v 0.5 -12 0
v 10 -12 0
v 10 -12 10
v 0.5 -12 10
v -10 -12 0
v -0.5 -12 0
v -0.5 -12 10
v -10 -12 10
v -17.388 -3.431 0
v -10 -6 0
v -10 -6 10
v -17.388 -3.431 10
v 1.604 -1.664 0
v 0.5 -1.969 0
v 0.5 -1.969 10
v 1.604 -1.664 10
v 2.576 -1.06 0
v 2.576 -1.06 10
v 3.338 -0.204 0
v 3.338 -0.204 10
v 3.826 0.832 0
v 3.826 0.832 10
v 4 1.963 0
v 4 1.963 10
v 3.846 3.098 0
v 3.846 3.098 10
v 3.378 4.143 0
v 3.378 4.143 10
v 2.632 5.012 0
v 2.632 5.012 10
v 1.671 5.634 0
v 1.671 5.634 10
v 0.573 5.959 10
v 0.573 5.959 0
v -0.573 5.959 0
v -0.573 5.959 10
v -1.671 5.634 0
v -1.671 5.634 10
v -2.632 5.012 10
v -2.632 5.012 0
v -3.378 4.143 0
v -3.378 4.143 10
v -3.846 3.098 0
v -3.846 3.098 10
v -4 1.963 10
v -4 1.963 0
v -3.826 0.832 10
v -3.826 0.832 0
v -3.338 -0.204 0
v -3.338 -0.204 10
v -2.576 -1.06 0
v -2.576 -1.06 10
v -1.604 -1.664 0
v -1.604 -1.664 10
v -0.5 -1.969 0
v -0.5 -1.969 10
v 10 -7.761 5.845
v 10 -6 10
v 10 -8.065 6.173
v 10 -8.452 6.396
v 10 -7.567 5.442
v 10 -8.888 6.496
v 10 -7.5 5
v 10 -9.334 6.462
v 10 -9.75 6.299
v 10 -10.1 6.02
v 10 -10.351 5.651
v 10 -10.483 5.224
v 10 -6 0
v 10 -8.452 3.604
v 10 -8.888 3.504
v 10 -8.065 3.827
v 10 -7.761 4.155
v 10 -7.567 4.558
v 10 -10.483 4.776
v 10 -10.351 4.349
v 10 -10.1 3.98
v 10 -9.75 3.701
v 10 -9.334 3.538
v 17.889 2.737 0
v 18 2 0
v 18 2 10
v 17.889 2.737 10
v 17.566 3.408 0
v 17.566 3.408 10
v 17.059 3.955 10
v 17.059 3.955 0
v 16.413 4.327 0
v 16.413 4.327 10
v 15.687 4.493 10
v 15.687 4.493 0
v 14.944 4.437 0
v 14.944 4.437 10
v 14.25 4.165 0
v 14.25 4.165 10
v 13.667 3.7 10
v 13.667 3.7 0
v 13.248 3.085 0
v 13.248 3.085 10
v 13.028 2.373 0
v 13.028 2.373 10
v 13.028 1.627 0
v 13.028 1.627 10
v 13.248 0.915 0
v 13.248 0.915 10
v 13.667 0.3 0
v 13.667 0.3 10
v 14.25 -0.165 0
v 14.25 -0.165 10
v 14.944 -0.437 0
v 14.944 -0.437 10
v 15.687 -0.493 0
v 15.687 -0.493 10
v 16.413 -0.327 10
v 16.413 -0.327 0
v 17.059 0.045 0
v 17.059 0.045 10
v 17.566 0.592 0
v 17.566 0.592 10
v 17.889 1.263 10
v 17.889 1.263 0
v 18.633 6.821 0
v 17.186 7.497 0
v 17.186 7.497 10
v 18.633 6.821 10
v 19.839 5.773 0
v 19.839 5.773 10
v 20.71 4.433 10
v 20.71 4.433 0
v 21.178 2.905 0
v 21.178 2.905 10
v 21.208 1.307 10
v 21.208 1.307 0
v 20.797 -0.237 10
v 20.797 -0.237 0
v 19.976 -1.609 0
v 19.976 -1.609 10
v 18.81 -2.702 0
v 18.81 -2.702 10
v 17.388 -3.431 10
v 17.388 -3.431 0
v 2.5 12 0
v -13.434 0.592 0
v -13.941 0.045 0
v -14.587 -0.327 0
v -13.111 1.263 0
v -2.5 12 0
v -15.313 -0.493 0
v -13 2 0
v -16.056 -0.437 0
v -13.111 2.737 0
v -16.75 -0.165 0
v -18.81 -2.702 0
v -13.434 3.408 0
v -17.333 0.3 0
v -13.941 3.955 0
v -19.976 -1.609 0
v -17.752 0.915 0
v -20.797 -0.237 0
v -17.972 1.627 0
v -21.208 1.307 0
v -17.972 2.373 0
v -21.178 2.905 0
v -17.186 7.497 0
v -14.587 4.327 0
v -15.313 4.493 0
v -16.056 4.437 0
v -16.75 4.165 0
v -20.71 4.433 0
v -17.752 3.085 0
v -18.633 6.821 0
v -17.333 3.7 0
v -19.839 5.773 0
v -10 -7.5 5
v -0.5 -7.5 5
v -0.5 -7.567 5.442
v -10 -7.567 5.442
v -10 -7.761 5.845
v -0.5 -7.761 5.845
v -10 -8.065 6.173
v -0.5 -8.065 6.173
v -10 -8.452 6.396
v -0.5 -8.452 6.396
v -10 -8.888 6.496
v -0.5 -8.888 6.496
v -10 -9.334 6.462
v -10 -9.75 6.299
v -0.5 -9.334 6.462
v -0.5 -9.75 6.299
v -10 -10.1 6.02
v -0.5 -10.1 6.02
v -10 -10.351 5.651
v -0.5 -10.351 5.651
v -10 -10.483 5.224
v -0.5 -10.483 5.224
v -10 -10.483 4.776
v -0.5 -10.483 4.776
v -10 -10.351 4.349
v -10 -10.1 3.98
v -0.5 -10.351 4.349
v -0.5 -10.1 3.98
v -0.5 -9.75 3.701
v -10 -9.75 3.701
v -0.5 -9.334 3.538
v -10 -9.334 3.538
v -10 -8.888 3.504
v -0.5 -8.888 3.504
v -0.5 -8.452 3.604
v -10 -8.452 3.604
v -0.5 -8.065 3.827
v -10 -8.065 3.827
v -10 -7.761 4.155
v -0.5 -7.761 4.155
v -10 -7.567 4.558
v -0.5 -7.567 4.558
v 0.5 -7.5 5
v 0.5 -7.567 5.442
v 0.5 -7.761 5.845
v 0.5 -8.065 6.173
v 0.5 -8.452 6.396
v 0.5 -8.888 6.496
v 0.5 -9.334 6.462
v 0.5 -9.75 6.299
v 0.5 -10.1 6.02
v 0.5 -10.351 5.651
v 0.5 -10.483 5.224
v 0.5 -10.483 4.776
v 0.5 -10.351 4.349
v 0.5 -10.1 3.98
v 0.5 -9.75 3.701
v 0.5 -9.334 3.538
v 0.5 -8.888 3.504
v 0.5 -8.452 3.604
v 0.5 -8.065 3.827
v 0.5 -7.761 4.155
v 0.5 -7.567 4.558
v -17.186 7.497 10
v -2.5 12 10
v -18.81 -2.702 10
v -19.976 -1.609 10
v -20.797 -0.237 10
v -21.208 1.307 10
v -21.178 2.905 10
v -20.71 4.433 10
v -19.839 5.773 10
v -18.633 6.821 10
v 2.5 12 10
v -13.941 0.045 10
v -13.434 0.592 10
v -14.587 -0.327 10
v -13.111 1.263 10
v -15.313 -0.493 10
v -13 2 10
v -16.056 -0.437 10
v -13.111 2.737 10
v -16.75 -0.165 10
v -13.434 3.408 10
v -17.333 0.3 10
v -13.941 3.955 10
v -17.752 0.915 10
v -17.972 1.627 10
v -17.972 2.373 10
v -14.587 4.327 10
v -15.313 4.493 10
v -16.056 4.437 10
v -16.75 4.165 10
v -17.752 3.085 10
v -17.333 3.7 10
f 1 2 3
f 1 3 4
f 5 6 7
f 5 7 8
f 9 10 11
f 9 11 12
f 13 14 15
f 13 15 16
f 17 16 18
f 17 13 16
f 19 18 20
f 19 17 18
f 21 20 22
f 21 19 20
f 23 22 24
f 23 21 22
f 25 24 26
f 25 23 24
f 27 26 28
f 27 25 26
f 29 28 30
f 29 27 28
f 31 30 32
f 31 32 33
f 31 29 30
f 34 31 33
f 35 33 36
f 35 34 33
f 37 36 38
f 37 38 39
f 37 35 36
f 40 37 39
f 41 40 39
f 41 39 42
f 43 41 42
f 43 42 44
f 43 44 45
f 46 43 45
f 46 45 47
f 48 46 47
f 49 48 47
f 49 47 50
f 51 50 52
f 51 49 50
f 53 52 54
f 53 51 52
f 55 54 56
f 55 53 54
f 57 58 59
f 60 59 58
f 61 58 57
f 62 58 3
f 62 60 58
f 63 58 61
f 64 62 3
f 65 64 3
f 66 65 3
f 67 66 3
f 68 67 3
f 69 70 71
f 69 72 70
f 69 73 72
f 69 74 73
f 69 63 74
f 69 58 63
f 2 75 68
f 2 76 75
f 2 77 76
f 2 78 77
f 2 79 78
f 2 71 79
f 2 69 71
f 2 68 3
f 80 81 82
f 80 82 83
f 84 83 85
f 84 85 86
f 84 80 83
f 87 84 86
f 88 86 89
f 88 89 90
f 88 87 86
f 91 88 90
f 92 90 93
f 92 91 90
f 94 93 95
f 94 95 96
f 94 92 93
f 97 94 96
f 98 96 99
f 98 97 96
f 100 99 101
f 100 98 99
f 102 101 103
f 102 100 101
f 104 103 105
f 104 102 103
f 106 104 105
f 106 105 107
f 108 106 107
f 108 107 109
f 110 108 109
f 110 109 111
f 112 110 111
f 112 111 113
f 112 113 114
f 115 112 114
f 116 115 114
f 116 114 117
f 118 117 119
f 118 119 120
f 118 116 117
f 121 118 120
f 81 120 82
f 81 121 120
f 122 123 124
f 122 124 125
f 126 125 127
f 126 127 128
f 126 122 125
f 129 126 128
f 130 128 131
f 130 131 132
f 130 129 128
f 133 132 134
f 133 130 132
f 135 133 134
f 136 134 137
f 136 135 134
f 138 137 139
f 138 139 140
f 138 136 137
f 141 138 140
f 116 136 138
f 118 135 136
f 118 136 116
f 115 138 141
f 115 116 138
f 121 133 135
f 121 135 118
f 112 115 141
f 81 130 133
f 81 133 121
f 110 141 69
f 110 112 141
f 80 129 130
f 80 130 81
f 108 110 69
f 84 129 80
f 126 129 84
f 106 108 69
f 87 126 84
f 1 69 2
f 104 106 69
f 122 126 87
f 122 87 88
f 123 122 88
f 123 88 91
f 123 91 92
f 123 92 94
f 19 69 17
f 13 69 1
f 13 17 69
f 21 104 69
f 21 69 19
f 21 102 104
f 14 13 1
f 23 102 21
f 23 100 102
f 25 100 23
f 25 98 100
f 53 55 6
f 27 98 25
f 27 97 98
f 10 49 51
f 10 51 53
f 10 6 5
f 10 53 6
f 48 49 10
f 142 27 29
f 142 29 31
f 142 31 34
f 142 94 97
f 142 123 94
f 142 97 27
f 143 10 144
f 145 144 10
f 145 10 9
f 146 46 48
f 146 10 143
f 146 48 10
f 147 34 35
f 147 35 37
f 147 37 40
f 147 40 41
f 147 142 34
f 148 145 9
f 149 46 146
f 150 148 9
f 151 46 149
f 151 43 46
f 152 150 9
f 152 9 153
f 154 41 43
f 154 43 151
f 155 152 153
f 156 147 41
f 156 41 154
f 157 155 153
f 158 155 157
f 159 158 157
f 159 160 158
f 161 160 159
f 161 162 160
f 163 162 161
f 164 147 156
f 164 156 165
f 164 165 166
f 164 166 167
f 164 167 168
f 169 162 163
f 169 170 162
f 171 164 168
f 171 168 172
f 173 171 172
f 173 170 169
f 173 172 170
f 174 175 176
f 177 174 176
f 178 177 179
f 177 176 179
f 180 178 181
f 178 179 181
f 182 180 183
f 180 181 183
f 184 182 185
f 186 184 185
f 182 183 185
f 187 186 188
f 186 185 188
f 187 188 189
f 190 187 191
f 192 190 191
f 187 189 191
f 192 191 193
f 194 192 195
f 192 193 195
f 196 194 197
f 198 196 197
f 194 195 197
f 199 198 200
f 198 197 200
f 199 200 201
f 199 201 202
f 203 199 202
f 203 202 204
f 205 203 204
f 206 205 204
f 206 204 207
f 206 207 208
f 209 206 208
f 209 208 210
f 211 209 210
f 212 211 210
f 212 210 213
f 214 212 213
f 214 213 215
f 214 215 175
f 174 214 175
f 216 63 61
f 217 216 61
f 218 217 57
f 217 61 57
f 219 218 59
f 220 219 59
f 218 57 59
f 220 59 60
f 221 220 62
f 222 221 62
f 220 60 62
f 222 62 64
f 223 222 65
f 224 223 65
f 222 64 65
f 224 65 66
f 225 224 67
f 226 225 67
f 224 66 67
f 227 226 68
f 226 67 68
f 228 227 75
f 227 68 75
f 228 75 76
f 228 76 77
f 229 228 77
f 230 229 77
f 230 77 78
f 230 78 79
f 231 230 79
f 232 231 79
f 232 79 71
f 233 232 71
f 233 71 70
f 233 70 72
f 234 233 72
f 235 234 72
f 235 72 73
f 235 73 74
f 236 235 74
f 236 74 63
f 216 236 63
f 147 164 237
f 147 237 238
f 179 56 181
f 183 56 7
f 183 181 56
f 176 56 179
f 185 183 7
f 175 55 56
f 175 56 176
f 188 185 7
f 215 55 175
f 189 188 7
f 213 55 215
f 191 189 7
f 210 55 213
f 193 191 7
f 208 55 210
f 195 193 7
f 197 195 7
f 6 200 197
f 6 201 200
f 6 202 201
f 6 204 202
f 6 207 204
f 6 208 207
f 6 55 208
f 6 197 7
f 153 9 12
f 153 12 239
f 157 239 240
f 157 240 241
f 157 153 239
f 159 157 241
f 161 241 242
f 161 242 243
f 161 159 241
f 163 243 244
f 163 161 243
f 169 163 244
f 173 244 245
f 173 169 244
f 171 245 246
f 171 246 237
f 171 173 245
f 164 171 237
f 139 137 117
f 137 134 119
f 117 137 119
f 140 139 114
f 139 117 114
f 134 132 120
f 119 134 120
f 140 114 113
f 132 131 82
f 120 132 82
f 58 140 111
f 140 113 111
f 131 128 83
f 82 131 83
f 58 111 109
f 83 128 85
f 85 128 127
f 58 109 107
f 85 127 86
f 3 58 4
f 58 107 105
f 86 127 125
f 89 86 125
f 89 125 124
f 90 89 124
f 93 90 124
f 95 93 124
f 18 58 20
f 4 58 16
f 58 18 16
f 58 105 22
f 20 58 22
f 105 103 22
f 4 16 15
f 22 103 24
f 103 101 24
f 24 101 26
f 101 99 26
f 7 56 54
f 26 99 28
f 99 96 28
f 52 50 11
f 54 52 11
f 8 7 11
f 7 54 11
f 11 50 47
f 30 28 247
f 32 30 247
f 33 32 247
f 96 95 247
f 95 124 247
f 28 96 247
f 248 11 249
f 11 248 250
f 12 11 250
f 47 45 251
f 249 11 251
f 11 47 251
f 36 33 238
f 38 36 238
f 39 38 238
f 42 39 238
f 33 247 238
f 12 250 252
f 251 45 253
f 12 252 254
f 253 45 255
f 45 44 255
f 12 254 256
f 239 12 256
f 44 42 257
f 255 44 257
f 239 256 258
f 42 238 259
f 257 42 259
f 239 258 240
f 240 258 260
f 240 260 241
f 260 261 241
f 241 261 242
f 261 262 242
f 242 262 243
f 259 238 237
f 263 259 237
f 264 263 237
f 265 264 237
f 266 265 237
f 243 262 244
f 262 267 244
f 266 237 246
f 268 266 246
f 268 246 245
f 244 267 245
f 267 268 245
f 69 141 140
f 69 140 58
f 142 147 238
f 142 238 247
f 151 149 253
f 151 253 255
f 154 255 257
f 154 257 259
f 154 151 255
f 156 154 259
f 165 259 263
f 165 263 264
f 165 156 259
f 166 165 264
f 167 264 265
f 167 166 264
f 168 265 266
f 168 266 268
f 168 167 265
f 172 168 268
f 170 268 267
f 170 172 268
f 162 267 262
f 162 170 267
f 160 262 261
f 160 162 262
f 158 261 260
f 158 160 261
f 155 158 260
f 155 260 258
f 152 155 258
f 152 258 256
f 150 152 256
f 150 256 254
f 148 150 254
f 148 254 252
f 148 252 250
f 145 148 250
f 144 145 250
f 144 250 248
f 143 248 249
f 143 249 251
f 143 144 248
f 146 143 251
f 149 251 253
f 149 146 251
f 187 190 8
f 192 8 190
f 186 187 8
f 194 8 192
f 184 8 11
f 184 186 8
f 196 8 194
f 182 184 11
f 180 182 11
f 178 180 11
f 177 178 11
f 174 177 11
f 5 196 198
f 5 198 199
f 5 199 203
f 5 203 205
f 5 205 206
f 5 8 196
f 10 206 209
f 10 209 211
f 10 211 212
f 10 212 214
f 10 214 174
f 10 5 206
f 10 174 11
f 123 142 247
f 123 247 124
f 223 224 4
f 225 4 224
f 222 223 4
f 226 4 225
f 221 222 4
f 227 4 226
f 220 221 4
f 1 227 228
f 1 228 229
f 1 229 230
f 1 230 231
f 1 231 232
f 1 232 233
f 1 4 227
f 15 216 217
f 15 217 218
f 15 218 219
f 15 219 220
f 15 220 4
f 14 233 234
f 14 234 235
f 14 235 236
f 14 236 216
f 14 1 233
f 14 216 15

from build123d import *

# Parameters (mm, degrees)
SKETCH_1_R          = 2.5
EXTRUDE_1_DEPTH     = 10
SKETCH_2_R          = 1.5
CUT_EXTRUDE_1_DEPTH = 35.936549629


with BuildPart() as part:
    # 草图1 → 凸台-拉伸1 (new body)
    with BuildSketch(Plane.XY):
        with BuildLine():
            Line((0.5, -12), (10, -12))
            Line((10, -12), (10, -6))
            Line((10, -6), (17.388376345, -3.431071237))
            ThreePointArc((17.388376345, -3.431071237), (21.249009569, 2.10671914), (17.185510359, 7.497413467))
            Line((17.185510359, 7.497413467), (2.5, 12))
            Line((2.5, 12), (-2.5, 12))
            Line((-2.5, 12), (-17.185510359, 7.497413467))
            ThreePointArc((-17.185510359, 7.497413467), (-20.123536772, 5.418392563), (-21.25, 2))
            ThreePointArc((-21.25, 2), (-20.186185228, -1.331991598), (-17.388376345, -3.431071237))
            Line((-17.388376345, -3.431071237), (-10, -6))
            Line((-10, -6), (-10, -12))
            Line((-10, -12), (-0.5, -12))
            Line((-0.5, -12), (-0.5, -6))
            Line((-0.5, -6), (-0.5, -1.968626967))
            ThreePointArc((-0.5, -1.968626967), (0, 6), (0.5, -1.968626967))
            Line((0.5, -1.968626967), (0.5, -6))
            Line((0.5, -6), (0.5, -12))
        make_face()
        with Locations((-15.5, 2)):
            Circle(SKETCH_1_R, mode=Mode.SUBTRACT)
        with Locations((15.5, 2)):
            Circle(SKETCH_1_R, mode=Mode.SUBTRACT)
    extrude(amount=EXTRUDE_1_DEPTH)

    # 草图2 → 切除-拉伸1 (cut, through all)
    with BuildSketch(Plane(origin=(10, 0, 0), x_dir=(0, 0, -1), z_dir=(1, 0, 0))):
        with Locations((-5, -9)):
            Circle(SKETCH_2_R)
    extrude(amount=-CUT_EXTRUDE_1_DEPTH, mode=Mode.SUBTRACT)


solid = part.part
